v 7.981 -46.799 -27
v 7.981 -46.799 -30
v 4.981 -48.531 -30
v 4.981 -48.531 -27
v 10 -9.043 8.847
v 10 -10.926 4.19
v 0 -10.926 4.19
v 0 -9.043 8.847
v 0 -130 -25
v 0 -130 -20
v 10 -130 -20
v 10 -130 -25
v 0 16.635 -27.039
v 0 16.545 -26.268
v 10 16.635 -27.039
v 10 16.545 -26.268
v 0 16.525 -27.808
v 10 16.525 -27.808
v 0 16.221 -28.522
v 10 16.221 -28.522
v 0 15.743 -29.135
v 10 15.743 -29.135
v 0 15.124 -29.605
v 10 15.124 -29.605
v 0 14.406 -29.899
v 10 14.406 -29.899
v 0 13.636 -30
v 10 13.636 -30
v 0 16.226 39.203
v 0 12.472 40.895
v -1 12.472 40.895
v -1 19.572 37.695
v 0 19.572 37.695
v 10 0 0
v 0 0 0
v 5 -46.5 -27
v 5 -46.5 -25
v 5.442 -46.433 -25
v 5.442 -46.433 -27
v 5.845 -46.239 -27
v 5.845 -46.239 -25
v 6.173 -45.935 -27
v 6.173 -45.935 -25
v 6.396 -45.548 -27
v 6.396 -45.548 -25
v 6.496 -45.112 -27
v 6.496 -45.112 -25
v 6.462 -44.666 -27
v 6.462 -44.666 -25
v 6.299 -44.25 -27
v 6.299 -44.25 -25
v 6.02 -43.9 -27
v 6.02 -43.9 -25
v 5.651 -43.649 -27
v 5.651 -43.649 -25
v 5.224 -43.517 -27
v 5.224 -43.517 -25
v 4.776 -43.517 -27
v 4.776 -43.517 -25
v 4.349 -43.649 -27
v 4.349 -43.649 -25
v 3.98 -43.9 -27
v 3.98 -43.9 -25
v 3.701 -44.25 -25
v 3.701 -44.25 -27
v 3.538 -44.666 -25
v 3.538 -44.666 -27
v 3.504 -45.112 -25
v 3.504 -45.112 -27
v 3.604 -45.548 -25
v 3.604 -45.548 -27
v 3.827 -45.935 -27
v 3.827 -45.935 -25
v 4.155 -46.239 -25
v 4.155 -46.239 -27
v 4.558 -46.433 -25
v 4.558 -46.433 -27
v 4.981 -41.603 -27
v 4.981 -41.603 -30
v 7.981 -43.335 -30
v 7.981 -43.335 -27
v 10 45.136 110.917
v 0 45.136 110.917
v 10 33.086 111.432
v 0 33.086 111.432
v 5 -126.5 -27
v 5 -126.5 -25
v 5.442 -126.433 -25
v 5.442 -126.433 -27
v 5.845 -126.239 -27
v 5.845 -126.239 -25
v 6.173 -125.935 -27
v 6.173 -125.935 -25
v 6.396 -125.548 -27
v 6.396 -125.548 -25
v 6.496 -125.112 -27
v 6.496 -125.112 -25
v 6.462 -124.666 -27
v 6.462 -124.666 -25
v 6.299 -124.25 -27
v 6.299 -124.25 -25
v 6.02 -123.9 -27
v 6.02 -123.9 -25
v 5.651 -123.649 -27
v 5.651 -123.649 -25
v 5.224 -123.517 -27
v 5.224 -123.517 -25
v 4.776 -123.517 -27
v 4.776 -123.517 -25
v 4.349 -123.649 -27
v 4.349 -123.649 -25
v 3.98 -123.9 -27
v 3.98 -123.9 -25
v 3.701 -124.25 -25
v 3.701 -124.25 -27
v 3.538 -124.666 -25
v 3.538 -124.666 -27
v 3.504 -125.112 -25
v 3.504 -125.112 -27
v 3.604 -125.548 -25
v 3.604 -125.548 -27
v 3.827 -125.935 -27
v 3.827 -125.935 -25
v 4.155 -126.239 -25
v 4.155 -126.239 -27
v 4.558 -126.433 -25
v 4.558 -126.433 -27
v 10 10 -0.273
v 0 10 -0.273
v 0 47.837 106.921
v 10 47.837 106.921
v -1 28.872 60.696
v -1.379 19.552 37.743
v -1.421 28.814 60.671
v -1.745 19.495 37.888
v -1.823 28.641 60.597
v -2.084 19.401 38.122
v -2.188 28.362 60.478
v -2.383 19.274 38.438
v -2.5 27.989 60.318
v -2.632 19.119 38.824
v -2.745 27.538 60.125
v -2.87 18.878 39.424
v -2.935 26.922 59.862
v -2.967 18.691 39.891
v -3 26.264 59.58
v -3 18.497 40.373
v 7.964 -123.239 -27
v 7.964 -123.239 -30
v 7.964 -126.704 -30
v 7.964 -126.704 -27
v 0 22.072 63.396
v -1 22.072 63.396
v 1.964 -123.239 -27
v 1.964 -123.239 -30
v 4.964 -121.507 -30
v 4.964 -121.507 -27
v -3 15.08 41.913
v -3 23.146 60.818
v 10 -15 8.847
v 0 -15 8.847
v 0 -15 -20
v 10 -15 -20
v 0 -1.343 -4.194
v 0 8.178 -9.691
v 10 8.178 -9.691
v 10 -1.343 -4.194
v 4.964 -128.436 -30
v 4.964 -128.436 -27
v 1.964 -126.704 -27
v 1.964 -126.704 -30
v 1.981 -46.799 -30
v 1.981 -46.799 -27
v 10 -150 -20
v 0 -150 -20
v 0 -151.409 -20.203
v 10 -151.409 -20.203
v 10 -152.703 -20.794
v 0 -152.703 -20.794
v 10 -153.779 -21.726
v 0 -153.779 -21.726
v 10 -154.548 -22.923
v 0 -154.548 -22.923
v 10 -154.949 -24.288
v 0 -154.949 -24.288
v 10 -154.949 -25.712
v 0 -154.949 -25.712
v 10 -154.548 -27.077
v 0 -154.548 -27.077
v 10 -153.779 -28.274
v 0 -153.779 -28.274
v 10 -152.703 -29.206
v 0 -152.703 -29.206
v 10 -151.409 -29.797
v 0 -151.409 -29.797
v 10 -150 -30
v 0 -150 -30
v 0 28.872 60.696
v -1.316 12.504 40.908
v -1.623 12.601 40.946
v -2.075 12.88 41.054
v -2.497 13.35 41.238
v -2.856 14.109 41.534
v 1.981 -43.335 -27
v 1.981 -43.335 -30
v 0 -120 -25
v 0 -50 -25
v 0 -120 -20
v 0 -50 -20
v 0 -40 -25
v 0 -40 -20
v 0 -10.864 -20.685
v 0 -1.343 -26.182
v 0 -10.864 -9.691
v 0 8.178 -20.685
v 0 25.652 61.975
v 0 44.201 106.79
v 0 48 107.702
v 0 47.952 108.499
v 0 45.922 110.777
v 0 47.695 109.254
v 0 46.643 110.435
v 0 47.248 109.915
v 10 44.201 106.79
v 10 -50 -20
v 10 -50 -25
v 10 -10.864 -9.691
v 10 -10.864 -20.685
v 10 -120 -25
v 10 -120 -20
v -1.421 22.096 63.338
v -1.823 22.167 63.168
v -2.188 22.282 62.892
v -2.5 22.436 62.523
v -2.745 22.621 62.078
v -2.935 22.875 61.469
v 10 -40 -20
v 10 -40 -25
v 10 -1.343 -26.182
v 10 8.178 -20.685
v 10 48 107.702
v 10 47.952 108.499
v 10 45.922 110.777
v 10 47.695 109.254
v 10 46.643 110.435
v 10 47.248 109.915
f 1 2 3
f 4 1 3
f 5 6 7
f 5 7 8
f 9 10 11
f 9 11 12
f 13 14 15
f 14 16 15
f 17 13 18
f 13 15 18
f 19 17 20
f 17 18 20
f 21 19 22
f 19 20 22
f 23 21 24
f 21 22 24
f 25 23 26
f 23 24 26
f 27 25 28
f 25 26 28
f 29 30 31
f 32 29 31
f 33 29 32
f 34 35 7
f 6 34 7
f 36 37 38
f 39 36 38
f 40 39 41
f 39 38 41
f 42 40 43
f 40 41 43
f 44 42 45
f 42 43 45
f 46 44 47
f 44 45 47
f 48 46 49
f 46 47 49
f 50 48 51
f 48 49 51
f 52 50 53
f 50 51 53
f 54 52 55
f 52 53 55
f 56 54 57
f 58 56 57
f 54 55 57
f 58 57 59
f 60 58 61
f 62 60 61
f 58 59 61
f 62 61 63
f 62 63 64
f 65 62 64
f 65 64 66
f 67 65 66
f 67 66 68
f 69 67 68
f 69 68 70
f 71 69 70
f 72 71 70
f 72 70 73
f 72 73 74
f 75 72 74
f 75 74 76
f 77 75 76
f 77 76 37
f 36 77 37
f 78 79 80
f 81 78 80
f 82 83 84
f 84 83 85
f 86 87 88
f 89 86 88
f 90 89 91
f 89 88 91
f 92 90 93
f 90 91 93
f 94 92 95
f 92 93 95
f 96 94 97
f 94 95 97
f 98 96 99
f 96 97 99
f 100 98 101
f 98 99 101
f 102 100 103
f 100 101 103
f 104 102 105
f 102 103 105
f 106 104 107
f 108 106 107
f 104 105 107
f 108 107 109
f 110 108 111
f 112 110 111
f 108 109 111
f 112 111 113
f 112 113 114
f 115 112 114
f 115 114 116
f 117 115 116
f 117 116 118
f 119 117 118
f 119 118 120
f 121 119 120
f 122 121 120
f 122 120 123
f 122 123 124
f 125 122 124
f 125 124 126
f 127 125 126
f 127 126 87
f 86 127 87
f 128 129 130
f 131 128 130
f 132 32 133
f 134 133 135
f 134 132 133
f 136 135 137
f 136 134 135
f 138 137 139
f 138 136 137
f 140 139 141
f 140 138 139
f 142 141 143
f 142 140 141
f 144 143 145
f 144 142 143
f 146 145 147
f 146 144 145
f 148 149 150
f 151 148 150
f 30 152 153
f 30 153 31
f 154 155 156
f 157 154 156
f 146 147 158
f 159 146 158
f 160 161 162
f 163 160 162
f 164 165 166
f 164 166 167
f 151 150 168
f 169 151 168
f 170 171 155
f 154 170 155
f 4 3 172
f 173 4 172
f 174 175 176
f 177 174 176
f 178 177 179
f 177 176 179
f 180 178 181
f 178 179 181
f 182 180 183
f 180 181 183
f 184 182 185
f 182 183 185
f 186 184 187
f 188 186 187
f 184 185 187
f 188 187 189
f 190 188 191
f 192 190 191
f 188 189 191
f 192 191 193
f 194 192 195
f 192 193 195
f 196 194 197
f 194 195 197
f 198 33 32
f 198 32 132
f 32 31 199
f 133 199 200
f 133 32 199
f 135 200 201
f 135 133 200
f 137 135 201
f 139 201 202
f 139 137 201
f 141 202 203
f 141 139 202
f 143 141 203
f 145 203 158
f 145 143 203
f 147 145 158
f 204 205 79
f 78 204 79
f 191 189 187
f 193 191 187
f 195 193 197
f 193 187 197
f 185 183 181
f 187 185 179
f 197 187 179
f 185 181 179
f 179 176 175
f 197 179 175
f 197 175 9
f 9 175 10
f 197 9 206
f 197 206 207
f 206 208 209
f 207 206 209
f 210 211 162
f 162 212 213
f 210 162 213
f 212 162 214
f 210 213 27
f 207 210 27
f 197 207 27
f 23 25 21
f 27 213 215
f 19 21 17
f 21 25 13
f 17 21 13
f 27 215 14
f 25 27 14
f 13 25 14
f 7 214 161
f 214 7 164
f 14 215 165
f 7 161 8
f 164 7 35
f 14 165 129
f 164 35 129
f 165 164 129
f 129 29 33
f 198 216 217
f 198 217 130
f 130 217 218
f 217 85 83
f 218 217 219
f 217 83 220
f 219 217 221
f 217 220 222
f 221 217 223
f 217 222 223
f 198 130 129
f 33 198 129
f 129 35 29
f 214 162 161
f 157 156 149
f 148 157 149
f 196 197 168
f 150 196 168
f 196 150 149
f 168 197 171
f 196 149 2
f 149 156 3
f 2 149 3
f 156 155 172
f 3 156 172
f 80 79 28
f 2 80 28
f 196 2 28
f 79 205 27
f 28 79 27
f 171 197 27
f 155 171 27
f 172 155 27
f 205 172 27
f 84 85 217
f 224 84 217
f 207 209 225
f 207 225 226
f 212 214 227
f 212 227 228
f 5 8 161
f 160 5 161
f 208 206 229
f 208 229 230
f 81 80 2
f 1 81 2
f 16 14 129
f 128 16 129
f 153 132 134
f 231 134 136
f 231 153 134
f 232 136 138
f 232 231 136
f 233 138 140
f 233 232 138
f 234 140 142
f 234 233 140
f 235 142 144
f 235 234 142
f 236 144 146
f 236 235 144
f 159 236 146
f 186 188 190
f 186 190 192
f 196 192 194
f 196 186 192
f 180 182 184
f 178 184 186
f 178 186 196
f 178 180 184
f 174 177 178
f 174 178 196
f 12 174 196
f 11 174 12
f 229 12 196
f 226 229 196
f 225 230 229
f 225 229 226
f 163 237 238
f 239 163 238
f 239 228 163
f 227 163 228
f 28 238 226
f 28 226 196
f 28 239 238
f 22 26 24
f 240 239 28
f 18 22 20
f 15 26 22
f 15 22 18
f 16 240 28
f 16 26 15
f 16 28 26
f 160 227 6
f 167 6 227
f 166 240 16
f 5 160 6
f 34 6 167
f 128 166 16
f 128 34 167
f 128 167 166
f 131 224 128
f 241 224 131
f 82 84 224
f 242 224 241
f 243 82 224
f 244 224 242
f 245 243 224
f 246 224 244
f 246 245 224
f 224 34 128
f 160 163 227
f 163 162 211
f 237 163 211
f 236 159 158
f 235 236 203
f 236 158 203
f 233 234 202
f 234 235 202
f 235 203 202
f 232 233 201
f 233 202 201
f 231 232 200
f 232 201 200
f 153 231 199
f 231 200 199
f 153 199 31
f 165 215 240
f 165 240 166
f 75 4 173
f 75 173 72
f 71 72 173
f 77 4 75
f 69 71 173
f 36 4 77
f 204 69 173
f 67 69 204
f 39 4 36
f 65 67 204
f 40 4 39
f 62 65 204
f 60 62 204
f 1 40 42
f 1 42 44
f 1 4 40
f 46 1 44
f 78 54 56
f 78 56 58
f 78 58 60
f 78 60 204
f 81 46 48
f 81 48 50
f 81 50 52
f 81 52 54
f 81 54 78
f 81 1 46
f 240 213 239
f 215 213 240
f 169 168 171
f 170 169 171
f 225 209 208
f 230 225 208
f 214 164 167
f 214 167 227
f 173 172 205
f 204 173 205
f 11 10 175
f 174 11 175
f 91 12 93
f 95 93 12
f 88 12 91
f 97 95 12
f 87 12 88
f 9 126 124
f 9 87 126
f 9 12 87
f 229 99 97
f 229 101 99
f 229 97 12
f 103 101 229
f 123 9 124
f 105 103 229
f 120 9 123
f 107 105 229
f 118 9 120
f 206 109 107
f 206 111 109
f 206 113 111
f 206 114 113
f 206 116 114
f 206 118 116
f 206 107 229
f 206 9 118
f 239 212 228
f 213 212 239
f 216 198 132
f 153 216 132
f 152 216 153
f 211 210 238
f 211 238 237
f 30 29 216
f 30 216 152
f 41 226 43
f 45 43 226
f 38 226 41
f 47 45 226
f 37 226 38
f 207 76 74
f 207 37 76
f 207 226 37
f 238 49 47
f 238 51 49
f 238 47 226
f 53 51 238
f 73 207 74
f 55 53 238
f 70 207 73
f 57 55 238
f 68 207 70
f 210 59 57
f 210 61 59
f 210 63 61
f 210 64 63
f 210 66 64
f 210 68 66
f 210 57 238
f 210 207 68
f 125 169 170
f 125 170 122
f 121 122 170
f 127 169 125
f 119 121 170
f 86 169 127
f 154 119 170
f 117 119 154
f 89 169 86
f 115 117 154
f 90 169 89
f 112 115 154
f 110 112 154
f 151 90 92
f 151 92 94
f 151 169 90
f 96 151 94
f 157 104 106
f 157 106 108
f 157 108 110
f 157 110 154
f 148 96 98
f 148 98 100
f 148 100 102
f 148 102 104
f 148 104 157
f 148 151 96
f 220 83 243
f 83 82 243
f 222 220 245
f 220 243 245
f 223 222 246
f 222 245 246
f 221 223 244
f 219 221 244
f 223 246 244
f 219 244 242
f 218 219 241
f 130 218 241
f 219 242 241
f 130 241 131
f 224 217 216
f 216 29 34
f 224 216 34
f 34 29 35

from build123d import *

# Parameters (mm, degrees)
PAD_DEPTH       = 10
SKETCH001_R     = 1.5
POCKET_DEPTH    = 5
PAD001_DEPTH    = 3
FILLET_R        = 2
FILLET001_R     = 3
FILLET002_R     = 3
POCKET001_DEPTH = 3


with BuildPart() as part:
    # Sketch → Pad (new body)
    with BuildSketch(Plane.YZ):
        with BuildLine():
            Line((33.085568, 111.431625), (44.200844, 106.790084))
            Line((44.200844, 106.790084), (0, 0))
            Line((0, 0), (-10.926105, 4.190362))
            Line((-10.926105, 4.190362), (-9.043063, 8.84724))
            Line((-9.043063, 8.84724), (-15, 8.84724))
            Line((-15, 8.84724), (-15, -20))
            Line((-15, -20), (-40, -20))
            Line((-40, -25), (-40, -20))
            Line((-50, -25), (-40, -25))
            Line((-50, -20), (-50, -25))
            Line((-50, -20), (-120, -20))
            Line((-120, -25), (-120, -20))
            Line((-130, -25), (-120, -25))
            Line((-130, -20), (-130, -25))
            Line((-130, -20), (-150, -20))
            ThreePointArc((-150, -20), (-155, -25), (-150, -30))
            Line((-150, -30), (17.484663, -30))
            Line((17.484663, -30), (10, -0.272781))
            Line((10, -0.272781), (49.18668, 110.743774))
            Line((49.18668, 110.743774), (33.085568, 111.431625))
        make_face()
        Polygon((8.178281, -20.684753), (8.178281, -9.690605), (-1.342931, -4.193531), (-10.864143, -9.690605), (-10.864143, -20.684753), (-1.342931, -26.181827), align=None, mode=Mode.SUBTRACT)
    extrude(amount=PAD_DEPTH)

    # Sketch001 → Pocket (cut)
    with BuildSketch(Plane(origin=(0, 0, -25), x_dir=(0, -1, 0), z_dir=(0, 0, 1))):
        with Locations((45, 5)):
            Circle(SKETCH001_R)
        with Locations((125, 5)):
            Circle(SKETCH001_R)
    extrude(amount=-POCKET_DEPTH, mode=Mode.SUBTRACT)

    # Sketch003 → Pad001 (new body)
    with BuildSketch(Plane(origin=(0, 0, 0), x_dir=(0, 1, 0), z_dir=(-1, 0, 0))):
        Polygon((19.571926, -37.694836), (28.872379, -60.69595), (22.072046, -63.396084), (12.471581, -40.894993), align=None)
    extrude(amount=PAD001_DEPTH)

    # Fillet
    fillet_edges = [part.edges().sort_by_distance(p)[0] for p in [
        (-3, 24.222153, 49.195393),
        (-3, 25.472213, 62.046017),
        (-3, 17.271813, 52.145538),
        (-3, 16.021754, 39.294915),
    ]]
    fillet(fillet_edges, radius=FILLET_R)

    # Fillet001
    fillet001_edges = [part.edges().sort_by_distance(p)[0] for p in [
        (5, 49.18668, 110.743774),
    ]]
    fillet(fillet001_edges, radius=FILLET001_R)

    # Fillet002
    fillet002_edges = [part.edges().sort_by_distance(p)[0] for p in [
        (5, 17.484663, -30),
    ]]
    fillet(fillet002_edges, radius=FILLET002_R)

    # Sketch002 → Pocket001 (cut)
    with BuildSketch(Plane.YX.offset(30)):
        Polygon((-123.239415, 1.964181), (-121.507364, 4.964181), (-123.239415, 7.964181), (-126.703517, 7.964181), (-128.435568, 4.964181), (-126.703517, 1.964181), align=None)
        Polygon((-43.334626, 7.980642), (-46.798728, 7.980642), (-48.530779, 4.980642), (-46.798728, 1.980642), (-43.334626, 1.980642), (-41.602575, 4.980642), align=None)
    extrude(amount=-POCKET001_DEPTH, mode=Mode.SUBTRACT)


solid = part.part
